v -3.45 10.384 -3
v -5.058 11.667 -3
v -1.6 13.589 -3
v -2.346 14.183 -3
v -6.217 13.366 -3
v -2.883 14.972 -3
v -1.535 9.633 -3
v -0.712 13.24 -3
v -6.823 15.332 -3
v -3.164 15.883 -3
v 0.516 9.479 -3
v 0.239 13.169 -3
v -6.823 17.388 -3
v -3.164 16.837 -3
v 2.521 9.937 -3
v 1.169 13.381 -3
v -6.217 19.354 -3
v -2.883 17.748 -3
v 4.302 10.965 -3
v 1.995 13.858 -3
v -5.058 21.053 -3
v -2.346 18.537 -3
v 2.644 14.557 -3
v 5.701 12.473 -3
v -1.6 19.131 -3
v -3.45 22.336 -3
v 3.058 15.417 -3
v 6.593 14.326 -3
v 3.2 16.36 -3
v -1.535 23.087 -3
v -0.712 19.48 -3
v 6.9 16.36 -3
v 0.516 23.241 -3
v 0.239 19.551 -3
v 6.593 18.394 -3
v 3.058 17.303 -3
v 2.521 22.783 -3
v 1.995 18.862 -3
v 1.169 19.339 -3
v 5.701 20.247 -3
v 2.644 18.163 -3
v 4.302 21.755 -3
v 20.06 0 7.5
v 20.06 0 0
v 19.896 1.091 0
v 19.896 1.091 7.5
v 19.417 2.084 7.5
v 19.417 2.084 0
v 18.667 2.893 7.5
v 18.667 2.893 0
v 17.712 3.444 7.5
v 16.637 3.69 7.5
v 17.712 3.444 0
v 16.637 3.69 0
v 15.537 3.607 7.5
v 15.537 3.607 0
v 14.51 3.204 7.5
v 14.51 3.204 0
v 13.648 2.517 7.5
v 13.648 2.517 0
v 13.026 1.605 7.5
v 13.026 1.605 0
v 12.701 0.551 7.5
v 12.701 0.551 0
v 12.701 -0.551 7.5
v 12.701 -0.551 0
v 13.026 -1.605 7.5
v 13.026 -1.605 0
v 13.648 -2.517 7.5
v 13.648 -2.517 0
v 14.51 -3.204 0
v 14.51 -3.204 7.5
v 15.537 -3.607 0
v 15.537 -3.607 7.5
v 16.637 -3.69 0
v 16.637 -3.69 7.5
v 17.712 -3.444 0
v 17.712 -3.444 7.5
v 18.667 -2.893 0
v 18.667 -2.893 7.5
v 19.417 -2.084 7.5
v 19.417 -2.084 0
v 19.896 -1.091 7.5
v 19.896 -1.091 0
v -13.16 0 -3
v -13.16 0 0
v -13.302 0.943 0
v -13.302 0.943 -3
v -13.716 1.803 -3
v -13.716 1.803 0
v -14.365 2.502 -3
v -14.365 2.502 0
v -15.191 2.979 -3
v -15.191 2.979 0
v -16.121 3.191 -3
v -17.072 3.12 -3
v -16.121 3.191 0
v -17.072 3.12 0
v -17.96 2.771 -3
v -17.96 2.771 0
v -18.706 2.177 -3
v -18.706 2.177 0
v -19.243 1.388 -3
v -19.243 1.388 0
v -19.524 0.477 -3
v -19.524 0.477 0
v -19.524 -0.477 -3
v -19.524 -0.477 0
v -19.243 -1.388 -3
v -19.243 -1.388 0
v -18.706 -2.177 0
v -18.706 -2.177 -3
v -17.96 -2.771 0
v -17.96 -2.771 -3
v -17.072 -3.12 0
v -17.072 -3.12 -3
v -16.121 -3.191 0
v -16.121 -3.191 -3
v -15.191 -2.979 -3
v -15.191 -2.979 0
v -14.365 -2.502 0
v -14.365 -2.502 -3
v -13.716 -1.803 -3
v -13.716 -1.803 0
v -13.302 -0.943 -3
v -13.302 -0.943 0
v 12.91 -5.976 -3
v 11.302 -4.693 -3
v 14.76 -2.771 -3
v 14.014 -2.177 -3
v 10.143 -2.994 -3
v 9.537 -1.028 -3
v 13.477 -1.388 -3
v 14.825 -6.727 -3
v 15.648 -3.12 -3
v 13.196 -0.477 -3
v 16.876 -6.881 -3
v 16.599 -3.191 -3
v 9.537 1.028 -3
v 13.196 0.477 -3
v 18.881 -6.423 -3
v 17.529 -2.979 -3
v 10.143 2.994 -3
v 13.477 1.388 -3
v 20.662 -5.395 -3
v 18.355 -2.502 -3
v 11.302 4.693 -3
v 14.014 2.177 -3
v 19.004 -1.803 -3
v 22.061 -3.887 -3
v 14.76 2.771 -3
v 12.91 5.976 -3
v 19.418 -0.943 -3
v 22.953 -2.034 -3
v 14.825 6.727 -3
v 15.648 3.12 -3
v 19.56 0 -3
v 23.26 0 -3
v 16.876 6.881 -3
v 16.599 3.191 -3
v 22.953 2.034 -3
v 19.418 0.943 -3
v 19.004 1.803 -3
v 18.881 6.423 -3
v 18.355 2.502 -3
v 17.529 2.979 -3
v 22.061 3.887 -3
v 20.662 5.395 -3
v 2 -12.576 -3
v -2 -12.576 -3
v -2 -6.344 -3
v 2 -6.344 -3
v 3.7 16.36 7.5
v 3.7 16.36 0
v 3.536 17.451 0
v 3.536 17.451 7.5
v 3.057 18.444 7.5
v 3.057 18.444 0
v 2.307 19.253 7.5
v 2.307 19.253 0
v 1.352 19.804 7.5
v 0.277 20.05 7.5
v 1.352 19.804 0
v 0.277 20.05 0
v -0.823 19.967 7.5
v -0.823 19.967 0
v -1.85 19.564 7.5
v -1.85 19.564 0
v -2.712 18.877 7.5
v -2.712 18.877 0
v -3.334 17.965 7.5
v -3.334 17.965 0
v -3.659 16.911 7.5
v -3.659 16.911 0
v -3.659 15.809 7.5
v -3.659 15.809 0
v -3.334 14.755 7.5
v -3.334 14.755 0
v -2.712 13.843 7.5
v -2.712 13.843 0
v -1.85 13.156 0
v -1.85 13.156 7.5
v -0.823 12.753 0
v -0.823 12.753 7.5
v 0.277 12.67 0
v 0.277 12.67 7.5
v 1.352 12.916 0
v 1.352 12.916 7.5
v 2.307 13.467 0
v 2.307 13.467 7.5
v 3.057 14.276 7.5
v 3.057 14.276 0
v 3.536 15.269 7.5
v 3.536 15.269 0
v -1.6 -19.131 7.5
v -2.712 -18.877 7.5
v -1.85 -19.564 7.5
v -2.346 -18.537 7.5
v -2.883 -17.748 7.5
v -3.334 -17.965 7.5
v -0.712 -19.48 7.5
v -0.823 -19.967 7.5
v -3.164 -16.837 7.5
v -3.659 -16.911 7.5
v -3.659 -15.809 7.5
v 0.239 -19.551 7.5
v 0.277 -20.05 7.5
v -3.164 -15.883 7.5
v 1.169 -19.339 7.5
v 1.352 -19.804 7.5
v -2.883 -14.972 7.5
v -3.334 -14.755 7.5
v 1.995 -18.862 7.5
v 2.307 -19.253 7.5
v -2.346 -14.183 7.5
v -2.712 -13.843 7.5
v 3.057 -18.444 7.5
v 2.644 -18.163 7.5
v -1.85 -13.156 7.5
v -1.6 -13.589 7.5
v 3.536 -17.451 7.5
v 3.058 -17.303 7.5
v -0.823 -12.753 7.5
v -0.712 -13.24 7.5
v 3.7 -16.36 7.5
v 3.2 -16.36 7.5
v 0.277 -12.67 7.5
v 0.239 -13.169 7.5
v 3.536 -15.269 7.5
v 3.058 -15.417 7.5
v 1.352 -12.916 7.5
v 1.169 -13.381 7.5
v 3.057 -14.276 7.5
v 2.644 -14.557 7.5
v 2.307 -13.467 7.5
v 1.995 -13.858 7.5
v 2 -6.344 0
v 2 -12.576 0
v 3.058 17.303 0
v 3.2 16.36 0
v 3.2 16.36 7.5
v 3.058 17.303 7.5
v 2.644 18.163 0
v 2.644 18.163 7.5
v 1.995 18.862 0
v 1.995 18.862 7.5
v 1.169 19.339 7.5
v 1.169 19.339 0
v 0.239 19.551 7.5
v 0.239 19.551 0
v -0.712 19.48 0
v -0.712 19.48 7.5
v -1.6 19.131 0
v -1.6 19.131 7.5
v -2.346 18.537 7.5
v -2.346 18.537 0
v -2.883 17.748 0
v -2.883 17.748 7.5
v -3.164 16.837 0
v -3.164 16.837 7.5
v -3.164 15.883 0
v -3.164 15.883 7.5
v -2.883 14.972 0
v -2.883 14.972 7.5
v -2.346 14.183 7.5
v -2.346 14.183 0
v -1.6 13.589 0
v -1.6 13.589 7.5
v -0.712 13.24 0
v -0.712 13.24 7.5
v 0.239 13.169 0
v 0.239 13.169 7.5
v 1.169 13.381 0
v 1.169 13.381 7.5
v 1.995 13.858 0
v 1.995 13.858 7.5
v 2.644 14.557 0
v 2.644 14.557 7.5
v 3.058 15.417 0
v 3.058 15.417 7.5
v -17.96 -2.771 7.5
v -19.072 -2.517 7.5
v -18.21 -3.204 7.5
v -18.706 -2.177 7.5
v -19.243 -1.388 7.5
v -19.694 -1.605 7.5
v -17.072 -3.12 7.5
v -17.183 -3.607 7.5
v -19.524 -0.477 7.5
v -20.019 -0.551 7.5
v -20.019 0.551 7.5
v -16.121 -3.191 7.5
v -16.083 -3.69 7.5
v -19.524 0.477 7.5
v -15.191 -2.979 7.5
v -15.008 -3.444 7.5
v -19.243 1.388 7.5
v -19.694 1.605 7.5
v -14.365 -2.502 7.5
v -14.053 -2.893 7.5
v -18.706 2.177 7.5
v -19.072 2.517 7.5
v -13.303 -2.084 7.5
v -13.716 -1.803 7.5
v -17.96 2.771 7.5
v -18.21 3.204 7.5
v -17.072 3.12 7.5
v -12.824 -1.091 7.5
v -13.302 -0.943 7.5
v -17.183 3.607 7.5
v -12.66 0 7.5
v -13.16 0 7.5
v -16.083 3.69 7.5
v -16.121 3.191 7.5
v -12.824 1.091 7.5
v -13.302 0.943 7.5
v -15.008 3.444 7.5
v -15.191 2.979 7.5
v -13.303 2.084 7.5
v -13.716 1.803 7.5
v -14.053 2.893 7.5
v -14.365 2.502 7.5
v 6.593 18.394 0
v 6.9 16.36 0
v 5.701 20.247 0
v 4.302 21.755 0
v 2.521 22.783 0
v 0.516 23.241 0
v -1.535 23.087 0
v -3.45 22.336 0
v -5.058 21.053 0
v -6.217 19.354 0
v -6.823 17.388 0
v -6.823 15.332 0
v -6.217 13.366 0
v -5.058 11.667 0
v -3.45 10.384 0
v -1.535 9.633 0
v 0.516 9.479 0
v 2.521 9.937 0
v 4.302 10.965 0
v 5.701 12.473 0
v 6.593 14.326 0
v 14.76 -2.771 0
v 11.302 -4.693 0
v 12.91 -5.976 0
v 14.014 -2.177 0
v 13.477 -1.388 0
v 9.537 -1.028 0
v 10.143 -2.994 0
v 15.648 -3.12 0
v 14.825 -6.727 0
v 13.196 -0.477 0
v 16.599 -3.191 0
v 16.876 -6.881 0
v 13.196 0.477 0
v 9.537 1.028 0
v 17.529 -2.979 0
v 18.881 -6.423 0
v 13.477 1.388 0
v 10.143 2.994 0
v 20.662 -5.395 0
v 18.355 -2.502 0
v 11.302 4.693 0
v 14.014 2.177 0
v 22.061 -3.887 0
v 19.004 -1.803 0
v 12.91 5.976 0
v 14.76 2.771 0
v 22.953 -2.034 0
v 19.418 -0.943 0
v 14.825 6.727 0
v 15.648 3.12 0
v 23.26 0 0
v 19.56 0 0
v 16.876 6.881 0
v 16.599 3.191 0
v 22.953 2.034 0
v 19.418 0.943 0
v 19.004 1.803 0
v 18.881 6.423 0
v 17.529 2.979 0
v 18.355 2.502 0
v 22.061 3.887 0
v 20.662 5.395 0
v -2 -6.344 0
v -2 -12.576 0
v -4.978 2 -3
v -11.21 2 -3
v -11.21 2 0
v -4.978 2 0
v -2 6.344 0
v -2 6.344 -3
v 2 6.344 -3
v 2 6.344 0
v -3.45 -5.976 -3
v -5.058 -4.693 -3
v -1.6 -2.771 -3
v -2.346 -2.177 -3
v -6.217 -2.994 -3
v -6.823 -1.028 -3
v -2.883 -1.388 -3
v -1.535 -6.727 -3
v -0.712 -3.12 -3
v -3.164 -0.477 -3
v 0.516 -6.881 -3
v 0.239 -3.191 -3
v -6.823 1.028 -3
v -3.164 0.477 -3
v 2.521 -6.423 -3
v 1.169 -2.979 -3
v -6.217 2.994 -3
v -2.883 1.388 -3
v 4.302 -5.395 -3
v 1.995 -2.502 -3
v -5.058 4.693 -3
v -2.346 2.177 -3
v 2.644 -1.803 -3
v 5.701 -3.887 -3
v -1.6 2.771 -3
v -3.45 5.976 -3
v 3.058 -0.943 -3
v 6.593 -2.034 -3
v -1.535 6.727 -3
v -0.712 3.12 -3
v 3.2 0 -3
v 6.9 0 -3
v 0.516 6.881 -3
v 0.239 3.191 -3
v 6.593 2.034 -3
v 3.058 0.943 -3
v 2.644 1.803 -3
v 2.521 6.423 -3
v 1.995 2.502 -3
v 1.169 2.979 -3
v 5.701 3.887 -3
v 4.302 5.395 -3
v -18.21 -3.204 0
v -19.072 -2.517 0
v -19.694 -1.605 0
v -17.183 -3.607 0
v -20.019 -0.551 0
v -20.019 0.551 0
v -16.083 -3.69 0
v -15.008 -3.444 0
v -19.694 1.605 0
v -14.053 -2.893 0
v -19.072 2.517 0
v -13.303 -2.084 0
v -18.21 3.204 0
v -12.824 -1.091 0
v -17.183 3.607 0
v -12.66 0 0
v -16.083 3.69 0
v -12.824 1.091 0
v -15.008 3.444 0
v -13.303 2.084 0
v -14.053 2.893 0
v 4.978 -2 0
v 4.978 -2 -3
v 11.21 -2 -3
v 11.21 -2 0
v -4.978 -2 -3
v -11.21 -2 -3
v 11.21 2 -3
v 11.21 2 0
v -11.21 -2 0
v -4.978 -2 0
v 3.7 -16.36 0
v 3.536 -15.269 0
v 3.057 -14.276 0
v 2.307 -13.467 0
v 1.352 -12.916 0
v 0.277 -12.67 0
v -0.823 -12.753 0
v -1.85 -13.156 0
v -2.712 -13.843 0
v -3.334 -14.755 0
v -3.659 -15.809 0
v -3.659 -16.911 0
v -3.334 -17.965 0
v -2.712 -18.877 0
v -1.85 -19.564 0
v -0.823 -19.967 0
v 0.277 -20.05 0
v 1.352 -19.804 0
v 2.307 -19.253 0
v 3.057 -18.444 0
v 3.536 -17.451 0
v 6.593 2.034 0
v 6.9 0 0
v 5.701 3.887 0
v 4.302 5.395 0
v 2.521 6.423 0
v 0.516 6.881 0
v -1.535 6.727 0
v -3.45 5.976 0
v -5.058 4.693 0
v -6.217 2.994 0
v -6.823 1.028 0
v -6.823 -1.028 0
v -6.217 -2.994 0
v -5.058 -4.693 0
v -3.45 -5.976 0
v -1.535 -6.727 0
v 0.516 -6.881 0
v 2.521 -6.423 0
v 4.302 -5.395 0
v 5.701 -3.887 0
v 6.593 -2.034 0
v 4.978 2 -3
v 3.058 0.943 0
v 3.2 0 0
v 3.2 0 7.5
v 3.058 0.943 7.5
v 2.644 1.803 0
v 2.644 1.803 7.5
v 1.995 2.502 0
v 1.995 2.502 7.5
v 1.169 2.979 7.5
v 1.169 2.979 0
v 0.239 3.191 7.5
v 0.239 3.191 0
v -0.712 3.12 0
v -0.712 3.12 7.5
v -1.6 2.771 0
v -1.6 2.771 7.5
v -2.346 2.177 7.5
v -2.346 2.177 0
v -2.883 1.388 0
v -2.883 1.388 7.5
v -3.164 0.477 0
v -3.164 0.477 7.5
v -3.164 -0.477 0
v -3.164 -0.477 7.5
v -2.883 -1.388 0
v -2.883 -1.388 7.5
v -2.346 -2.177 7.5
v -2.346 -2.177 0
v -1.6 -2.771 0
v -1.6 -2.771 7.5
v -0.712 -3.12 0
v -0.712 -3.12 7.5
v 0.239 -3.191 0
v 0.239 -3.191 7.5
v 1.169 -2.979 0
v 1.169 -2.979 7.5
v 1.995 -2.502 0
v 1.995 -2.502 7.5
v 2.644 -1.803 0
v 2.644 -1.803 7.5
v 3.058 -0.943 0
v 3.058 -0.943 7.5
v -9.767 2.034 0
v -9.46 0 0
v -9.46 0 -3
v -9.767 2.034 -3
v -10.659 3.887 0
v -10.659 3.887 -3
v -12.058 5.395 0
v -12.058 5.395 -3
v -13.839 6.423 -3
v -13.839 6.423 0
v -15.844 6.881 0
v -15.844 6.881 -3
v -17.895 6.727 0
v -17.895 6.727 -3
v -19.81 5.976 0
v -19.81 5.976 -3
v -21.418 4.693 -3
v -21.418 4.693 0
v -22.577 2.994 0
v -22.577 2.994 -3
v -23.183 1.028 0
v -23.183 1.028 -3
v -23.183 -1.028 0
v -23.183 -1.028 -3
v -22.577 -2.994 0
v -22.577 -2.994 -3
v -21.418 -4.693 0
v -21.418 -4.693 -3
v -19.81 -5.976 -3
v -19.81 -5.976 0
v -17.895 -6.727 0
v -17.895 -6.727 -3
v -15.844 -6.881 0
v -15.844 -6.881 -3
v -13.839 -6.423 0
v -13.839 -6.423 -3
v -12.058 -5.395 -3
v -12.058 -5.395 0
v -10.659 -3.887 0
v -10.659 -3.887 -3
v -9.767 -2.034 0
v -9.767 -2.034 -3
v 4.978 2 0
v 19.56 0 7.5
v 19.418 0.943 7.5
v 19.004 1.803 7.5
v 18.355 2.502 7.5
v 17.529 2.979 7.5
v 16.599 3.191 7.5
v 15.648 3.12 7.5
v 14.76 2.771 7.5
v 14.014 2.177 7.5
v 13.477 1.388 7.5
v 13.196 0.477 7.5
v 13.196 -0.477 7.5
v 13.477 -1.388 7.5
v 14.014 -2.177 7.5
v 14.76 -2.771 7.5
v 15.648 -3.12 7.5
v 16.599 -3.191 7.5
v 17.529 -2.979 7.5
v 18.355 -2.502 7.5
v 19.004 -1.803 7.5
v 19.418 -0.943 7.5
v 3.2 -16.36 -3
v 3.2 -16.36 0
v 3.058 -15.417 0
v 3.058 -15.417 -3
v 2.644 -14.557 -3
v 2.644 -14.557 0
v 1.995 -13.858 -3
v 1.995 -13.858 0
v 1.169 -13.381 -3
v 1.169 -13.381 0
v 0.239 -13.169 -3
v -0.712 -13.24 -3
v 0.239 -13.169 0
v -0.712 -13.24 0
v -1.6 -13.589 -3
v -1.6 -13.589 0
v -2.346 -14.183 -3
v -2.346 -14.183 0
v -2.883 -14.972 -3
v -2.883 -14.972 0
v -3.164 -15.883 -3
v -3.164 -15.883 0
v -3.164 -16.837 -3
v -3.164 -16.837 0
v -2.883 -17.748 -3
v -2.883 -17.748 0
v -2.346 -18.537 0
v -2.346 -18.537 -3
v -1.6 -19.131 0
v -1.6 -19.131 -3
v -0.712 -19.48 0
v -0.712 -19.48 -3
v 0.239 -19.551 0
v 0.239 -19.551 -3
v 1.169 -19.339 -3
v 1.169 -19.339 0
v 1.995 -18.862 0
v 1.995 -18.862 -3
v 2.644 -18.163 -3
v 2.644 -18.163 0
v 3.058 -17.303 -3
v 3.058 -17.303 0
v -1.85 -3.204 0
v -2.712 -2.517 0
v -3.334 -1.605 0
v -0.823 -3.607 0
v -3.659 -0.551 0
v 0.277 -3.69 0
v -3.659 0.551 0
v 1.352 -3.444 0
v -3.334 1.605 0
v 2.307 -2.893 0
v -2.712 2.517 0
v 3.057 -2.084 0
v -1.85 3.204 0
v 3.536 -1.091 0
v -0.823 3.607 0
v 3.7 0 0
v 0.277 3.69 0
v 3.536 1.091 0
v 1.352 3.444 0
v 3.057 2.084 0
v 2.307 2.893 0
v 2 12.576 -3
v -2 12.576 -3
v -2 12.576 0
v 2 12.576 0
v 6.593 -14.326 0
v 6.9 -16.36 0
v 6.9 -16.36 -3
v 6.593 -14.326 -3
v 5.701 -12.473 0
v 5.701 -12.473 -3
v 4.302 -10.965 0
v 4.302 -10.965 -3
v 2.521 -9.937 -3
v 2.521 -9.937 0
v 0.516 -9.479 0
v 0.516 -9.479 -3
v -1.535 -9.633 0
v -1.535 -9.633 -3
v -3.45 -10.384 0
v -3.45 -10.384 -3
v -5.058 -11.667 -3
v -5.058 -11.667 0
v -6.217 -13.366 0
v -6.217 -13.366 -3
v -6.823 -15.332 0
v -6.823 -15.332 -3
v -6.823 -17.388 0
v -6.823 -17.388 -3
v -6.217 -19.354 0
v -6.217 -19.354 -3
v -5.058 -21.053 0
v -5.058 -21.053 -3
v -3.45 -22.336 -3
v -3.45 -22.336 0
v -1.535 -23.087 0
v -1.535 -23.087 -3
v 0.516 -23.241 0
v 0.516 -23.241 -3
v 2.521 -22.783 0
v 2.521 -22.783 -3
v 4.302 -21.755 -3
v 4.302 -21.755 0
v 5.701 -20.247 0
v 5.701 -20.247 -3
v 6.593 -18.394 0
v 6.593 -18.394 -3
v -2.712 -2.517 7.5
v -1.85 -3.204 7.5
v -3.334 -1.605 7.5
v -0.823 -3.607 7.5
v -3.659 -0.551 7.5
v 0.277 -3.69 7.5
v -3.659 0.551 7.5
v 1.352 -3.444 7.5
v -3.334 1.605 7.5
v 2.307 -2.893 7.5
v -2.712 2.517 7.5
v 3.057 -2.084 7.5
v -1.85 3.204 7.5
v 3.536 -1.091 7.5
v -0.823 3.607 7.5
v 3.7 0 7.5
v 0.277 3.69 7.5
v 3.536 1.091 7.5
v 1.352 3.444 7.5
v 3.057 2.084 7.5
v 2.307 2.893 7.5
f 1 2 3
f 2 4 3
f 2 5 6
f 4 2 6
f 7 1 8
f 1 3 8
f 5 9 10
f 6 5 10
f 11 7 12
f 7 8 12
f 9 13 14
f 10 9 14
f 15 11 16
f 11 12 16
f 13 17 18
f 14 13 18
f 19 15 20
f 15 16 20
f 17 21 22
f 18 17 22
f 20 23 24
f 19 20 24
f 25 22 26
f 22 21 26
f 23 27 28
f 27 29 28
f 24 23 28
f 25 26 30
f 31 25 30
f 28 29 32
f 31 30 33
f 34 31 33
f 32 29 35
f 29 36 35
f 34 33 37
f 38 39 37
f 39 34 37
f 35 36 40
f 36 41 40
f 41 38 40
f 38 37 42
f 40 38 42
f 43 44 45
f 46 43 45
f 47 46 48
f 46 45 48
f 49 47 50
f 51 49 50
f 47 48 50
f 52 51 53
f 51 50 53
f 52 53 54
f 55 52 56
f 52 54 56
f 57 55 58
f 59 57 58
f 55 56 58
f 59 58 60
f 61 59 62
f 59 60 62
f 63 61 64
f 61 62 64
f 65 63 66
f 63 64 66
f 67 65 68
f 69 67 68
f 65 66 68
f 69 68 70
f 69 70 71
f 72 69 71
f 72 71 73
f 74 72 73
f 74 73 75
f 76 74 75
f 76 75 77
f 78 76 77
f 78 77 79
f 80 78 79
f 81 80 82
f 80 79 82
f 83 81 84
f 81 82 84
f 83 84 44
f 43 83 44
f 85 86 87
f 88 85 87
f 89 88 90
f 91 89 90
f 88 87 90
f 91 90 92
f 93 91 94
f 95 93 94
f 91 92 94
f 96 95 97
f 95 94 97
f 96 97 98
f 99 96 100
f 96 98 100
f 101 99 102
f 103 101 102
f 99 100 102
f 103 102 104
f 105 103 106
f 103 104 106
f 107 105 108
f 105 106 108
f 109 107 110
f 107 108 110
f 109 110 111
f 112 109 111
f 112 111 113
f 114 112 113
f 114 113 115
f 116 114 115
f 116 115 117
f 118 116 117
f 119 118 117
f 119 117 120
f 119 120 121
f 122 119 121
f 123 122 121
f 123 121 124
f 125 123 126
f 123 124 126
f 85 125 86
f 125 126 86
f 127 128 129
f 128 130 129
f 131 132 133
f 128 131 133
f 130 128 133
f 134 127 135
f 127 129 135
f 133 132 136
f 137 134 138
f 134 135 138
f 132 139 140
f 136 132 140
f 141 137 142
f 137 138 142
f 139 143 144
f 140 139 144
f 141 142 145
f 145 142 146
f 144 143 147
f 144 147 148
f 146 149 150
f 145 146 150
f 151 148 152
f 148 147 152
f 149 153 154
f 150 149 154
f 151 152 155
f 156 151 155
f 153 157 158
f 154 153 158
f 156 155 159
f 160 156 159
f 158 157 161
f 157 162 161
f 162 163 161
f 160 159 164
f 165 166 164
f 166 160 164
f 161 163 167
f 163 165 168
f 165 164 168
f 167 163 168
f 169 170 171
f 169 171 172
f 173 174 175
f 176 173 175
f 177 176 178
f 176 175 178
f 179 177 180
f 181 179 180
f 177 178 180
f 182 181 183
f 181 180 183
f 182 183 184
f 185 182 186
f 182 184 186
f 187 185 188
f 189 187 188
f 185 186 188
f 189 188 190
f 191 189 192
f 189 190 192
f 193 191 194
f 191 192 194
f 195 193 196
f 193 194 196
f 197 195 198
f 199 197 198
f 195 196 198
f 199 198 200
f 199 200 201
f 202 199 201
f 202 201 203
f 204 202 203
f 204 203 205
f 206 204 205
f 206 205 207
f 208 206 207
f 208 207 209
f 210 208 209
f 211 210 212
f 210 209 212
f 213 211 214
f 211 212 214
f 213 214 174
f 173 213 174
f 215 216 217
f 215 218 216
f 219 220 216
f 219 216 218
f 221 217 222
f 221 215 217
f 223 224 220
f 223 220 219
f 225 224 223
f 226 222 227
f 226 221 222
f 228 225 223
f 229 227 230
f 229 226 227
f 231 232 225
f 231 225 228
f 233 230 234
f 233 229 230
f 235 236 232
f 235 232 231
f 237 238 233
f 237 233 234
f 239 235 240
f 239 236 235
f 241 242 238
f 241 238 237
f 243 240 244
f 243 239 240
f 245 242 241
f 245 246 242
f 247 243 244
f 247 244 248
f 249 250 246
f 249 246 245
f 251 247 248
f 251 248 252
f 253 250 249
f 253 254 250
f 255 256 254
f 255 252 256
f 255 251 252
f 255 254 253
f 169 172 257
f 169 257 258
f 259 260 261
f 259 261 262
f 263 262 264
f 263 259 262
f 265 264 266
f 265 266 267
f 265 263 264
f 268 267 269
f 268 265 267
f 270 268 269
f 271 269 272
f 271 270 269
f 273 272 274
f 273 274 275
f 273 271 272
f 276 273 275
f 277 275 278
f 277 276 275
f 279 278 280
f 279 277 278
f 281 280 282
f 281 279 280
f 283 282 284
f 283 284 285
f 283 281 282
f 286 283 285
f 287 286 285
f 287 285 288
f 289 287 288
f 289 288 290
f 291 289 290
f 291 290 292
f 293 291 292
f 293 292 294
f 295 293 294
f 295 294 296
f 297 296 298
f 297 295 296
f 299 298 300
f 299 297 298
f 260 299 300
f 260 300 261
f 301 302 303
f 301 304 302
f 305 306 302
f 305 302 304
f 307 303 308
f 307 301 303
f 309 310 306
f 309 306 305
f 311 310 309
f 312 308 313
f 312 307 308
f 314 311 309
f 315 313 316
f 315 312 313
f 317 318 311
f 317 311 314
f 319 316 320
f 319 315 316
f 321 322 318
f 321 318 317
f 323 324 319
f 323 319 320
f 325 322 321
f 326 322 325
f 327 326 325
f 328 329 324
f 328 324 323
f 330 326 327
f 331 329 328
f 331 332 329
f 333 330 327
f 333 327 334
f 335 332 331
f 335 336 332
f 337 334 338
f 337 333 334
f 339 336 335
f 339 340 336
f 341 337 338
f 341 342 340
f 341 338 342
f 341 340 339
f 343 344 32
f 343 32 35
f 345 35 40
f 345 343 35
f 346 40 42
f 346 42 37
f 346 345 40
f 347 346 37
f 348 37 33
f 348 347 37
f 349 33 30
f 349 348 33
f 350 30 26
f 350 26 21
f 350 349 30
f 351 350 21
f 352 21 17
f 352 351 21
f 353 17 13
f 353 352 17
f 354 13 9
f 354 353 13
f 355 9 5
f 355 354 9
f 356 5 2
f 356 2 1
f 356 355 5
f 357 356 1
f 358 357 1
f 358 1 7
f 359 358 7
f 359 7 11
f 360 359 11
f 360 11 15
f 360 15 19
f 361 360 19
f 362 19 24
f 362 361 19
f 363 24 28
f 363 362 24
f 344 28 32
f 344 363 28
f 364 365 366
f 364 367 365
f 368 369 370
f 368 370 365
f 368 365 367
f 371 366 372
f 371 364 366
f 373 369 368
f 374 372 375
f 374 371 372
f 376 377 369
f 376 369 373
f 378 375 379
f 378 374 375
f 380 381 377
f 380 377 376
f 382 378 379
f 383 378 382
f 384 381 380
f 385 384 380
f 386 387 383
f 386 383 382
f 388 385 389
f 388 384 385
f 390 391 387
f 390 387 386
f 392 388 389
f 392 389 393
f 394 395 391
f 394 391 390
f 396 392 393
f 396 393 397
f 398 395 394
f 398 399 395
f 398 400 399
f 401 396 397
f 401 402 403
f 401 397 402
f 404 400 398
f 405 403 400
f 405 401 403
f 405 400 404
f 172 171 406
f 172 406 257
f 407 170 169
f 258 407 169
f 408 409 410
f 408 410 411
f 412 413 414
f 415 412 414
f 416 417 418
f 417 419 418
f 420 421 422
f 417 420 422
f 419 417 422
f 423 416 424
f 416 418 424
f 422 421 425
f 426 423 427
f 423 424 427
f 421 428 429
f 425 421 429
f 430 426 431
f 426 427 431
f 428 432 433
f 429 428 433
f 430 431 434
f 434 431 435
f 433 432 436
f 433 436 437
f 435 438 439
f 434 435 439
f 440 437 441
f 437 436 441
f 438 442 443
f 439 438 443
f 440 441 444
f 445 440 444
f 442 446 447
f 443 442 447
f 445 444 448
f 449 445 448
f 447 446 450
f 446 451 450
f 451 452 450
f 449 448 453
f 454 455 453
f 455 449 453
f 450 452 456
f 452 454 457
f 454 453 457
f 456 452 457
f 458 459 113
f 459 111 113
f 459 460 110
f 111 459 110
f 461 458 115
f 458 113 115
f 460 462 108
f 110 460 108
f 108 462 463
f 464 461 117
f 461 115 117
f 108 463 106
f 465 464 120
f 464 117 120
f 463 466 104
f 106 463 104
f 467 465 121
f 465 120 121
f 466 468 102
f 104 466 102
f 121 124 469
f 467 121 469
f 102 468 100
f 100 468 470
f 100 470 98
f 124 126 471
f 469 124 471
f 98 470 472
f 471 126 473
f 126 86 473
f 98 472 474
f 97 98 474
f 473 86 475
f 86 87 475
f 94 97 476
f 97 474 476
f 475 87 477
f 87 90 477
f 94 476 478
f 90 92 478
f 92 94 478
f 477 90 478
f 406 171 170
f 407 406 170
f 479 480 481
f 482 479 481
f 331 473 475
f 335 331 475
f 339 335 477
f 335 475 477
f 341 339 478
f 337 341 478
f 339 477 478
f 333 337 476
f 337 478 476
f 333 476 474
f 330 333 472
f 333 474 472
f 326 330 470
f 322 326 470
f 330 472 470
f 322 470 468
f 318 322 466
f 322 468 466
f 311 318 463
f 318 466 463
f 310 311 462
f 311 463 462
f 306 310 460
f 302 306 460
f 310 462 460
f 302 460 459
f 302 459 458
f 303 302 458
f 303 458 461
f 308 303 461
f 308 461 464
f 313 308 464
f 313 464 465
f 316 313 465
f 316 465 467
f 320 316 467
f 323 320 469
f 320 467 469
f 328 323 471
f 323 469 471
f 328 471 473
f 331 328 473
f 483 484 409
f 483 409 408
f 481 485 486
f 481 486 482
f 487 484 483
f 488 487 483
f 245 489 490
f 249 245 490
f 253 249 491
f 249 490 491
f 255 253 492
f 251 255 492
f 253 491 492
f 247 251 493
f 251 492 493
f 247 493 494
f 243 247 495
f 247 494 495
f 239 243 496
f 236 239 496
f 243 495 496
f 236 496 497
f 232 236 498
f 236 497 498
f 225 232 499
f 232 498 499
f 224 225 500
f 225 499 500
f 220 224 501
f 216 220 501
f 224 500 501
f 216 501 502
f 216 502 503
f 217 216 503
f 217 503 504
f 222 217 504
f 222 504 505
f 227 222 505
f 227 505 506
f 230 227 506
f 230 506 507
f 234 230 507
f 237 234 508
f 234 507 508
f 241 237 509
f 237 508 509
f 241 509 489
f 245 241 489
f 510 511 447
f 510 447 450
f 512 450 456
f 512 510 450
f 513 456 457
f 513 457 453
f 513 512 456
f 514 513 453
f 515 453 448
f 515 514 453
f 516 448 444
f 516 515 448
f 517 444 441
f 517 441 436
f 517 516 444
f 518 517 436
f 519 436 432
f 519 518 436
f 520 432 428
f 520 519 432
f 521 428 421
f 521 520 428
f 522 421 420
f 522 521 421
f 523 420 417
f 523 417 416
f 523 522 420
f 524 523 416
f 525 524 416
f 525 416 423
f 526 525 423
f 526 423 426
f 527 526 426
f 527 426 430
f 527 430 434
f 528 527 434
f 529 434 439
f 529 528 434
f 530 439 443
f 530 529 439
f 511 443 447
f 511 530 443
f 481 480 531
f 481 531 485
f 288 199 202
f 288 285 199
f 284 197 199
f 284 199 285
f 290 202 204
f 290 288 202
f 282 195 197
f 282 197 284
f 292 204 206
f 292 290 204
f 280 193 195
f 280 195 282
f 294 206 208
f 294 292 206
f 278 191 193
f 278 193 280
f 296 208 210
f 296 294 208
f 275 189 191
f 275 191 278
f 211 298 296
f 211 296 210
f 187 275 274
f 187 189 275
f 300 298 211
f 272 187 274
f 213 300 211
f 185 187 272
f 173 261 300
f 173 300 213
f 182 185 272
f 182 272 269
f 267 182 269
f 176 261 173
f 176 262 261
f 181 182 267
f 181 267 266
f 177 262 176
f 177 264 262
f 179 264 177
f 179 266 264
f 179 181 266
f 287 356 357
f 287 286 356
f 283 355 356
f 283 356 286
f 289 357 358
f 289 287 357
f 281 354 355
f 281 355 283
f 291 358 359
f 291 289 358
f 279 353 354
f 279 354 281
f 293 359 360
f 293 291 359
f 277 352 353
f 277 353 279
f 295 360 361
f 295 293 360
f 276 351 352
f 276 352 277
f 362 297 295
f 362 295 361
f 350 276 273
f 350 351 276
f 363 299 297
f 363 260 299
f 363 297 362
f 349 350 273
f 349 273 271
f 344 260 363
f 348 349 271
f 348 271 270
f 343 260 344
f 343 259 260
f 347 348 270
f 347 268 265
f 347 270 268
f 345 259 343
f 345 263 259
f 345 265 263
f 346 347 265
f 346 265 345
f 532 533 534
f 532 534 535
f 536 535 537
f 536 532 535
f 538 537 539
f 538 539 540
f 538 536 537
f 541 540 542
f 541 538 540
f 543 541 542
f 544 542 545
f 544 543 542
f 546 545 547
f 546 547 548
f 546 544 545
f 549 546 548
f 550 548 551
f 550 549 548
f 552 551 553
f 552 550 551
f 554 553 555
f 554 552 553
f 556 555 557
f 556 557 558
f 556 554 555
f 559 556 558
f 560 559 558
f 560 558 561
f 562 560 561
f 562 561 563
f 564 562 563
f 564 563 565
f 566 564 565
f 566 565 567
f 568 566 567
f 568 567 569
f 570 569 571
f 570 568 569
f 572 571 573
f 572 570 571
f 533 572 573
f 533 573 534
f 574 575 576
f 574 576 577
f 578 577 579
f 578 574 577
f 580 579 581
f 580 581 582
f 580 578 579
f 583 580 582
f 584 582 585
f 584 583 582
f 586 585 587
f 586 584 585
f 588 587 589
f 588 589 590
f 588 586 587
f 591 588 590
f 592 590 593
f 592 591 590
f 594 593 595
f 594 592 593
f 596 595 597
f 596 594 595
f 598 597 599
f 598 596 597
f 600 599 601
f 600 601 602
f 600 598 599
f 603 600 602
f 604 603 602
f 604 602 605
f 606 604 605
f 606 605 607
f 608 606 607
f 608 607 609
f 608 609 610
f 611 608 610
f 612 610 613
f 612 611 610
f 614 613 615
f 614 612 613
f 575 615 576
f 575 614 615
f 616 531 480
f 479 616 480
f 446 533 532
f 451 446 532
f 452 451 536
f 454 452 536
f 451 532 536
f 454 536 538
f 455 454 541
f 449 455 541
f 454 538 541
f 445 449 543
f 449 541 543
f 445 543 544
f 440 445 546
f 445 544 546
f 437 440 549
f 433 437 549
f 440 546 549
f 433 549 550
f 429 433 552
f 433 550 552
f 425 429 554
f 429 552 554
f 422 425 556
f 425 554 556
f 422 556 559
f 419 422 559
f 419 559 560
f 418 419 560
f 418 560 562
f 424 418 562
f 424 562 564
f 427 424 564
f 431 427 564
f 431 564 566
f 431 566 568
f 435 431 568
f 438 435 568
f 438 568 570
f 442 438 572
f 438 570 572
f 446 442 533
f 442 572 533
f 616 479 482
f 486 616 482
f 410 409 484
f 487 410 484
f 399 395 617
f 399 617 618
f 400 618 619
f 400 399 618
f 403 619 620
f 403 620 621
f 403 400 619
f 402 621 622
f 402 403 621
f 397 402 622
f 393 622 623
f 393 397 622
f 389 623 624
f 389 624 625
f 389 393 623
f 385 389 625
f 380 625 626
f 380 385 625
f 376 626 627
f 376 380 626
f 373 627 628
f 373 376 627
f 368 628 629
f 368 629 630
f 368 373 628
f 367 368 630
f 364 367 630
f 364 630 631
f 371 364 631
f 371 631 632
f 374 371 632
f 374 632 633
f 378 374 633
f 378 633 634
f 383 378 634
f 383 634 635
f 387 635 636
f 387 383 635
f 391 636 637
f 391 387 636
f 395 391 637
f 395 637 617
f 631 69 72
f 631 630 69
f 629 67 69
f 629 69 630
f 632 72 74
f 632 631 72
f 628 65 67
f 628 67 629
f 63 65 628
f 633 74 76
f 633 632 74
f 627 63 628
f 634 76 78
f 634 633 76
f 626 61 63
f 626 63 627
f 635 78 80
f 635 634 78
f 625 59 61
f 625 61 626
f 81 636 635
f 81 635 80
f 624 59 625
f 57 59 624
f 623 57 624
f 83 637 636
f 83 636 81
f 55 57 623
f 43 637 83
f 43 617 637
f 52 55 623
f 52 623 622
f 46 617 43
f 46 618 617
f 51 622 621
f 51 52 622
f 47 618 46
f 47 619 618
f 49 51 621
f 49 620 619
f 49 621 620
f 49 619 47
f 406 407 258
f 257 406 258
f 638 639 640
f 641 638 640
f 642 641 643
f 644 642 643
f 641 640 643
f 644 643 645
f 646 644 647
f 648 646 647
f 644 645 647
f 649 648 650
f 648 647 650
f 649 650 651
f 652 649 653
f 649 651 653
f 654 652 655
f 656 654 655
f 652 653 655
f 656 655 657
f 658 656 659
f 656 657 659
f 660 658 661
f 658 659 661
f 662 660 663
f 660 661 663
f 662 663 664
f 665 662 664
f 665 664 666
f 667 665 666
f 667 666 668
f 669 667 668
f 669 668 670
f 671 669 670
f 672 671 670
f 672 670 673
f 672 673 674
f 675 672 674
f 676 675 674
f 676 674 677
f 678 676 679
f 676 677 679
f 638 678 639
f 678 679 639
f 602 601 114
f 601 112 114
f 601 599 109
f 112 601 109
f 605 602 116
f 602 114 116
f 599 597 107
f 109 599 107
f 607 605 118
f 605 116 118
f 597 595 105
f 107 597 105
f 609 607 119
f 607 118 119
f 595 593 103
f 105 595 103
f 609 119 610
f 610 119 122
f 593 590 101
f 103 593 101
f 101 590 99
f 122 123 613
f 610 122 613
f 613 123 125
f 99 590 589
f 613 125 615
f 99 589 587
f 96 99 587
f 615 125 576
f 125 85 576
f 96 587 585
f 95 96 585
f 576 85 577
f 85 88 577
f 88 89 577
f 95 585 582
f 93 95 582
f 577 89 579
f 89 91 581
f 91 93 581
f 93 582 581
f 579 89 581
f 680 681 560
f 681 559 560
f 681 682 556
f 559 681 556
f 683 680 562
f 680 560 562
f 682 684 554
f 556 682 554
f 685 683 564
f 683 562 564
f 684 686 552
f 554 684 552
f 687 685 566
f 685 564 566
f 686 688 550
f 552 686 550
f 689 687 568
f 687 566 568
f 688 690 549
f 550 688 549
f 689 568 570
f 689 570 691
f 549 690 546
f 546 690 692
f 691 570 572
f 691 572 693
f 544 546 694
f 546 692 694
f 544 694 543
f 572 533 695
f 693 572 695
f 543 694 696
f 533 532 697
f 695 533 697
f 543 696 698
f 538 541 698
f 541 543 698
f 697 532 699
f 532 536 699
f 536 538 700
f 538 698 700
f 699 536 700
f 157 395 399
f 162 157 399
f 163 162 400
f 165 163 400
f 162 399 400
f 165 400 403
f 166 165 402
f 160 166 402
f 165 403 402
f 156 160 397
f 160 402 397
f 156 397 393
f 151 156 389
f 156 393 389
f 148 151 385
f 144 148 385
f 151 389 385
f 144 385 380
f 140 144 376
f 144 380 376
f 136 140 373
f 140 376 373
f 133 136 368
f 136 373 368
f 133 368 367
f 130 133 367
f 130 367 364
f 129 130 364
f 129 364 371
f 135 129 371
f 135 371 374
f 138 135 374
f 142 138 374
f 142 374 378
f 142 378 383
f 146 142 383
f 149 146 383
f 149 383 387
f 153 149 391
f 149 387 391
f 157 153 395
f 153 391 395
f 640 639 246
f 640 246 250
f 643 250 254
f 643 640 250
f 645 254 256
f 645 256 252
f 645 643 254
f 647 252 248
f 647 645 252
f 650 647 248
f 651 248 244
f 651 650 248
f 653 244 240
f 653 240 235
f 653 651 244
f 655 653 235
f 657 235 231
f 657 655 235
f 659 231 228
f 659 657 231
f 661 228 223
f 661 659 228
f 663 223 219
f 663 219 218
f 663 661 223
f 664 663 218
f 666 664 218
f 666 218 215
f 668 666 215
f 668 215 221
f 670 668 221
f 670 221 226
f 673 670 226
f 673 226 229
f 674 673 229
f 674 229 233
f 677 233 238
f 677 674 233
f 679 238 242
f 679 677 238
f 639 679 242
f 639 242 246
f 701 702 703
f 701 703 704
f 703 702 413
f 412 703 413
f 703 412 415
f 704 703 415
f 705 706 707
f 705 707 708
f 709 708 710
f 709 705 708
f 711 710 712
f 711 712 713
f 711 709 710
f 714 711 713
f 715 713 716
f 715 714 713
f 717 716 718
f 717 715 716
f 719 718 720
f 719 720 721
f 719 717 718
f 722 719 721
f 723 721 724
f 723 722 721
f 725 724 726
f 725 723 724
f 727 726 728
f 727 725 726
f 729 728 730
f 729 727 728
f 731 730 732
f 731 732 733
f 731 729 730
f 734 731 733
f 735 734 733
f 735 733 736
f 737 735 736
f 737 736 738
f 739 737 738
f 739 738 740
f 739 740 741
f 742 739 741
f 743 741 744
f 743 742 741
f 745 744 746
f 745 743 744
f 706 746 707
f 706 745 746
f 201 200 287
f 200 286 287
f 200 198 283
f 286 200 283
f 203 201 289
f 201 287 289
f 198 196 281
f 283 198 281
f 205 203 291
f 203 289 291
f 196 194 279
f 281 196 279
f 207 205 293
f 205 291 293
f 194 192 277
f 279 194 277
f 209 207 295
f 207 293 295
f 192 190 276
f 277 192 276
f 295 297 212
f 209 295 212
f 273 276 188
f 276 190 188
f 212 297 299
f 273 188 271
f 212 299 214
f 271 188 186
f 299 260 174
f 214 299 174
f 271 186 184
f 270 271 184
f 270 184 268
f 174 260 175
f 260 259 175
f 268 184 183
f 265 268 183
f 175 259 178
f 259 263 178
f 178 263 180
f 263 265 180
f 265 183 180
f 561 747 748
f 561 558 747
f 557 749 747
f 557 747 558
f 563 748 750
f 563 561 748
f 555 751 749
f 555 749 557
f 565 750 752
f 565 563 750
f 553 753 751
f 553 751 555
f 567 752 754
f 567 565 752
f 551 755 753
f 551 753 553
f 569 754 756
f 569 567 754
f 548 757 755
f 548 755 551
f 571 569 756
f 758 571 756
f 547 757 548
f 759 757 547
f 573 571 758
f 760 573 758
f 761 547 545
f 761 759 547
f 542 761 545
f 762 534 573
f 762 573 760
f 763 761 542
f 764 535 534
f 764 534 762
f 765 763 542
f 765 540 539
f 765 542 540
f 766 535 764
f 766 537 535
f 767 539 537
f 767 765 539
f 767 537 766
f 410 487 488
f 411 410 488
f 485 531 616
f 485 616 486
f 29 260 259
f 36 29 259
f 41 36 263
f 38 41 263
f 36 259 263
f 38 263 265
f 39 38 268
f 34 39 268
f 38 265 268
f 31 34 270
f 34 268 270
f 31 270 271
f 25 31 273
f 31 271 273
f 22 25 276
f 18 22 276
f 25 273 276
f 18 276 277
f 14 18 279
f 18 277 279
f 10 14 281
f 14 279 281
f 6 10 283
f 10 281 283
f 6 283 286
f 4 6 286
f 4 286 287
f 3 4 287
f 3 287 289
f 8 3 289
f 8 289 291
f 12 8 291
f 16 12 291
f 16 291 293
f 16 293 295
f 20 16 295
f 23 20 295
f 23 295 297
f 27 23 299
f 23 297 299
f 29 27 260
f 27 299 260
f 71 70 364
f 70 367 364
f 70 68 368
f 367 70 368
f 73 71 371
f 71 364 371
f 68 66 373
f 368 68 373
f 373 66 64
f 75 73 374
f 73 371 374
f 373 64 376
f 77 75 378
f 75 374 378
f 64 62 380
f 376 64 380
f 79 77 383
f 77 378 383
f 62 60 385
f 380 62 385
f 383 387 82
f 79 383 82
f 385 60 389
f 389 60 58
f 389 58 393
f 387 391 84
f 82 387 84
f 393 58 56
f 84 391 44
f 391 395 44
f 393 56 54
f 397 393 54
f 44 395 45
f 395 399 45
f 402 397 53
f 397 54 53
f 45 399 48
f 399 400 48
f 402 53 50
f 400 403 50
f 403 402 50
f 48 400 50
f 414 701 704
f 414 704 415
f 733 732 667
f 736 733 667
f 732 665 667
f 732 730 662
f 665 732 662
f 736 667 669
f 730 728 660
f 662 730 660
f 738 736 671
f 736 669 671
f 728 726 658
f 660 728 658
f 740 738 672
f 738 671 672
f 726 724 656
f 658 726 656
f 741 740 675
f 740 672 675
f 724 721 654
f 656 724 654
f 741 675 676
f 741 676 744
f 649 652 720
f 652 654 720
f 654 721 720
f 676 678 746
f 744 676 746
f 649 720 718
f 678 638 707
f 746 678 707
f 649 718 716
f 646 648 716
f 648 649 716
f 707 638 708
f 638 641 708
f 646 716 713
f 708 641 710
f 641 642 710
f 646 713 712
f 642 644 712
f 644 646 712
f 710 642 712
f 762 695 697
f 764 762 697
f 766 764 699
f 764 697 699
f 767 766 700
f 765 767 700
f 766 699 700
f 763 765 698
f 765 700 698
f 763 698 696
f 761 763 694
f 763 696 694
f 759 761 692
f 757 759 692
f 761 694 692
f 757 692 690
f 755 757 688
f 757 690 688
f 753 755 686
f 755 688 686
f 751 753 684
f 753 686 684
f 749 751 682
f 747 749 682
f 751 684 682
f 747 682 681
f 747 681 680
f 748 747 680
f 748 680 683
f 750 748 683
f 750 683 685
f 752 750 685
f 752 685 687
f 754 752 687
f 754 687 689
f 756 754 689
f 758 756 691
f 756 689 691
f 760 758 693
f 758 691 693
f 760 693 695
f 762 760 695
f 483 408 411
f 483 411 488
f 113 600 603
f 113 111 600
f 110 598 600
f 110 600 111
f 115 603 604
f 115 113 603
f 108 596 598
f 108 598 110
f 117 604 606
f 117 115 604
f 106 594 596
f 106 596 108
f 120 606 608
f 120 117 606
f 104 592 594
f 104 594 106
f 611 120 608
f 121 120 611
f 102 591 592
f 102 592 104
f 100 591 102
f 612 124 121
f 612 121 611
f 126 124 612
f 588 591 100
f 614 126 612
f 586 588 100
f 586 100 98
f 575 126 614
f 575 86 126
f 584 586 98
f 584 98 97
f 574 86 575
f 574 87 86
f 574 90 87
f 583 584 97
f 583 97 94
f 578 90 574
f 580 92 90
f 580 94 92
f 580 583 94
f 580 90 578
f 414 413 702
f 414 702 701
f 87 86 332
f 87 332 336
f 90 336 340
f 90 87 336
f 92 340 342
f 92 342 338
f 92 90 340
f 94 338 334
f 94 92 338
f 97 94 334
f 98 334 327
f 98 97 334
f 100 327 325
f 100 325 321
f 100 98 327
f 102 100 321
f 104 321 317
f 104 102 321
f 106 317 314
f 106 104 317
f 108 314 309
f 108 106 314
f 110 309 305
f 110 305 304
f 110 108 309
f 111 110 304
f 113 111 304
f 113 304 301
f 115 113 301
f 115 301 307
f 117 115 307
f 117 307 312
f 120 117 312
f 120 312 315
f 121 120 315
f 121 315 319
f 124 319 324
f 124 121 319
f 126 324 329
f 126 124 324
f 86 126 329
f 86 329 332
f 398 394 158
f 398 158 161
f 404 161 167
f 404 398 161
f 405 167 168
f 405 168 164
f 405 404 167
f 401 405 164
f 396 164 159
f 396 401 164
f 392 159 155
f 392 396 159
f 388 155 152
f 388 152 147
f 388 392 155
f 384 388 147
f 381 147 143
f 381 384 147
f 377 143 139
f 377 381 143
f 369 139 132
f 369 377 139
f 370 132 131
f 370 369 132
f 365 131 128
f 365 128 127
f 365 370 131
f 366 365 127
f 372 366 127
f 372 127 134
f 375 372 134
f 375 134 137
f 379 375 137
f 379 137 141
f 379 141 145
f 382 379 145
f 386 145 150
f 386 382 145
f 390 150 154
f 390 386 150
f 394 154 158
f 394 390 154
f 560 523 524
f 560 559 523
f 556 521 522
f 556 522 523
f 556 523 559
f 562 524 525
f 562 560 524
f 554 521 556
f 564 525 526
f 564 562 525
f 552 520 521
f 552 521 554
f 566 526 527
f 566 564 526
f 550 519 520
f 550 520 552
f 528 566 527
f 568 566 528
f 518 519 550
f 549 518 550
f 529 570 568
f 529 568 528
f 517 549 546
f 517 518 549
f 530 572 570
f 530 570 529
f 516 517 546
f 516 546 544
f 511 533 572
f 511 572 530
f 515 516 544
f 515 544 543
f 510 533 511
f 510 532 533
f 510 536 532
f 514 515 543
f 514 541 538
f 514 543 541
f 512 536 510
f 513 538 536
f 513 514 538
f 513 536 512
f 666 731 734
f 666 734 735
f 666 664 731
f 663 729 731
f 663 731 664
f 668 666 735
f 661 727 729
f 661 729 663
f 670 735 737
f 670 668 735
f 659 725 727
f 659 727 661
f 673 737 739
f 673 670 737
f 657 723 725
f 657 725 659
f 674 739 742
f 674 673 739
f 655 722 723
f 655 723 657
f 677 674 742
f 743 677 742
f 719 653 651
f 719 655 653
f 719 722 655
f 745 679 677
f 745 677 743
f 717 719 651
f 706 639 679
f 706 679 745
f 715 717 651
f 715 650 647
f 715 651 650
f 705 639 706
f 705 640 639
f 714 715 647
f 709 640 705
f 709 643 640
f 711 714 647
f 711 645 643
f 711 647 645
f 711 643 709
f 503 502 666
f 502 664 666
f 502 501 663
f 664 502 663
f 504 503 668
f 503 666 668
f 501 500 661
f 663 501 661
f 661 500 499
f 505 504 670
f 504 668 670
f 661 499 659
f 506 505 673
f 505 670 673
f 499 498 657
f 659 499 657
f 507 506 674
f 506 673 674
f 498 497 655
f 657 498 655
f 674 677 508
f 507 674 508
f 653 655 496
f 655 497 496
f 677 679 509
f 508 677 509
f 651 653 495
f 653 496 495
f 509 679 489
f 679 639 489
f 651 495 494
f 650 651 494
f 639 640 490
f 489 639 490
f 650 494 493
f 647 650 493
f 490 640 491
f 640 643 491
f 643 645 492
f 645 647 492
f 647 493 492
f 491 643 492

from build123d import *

# Parameters (mm, degrees)
F0_R     = 3.7
F0_R_2   = 3.2
F1_DEPTH = 7.5
F2_R     = 6.9
F2_R_2   = 3.2
F3_DEPTH = 3
F4_W     = 4
F4_H     = 6.231944
F4_W_2   = 6.231944
F4_H_2   = 4
F5_DEPTH = 3


with BuildPart() as f1:
    # F0 (on Top) → F1 (new body)
    with BuildSketch(Plane.XY):
        Circle(F0_R)
        Circle(F0_R_2, mode=Mode.SUBTRACT)
        with Locations((0, 16.36)):
            Circle(F0_R)
        with Locations((0, 16.36)):
            Circle(F0_R_2, mode=Mode.SUBTRACT)
        with Locations((0, -16.36)):
            Circle(F0_R)
        with Locations((0, -16.36)):
            Circle(F0_R_2, mode=Mode.SUBTRACT)
        with Locations((16.36, 0)):
            Circle(F0_R)
        with Locations((16.36, 0)):
            Circle(F0_R_2, mode=Mode.SUBTRACT)
        with Locations((-16.36, 0)):
            Circle(F0_R)
        with Locations((-16.36, 0)):
            Circle(F0_R_2, mode=Mode.SUBTRACT)
    extrude(amount=F1_DEPTH)


with BuildPart() as f3:
    # F2 (on Top) → F3 (new body)
    with BuildSketch(Plane.XY):
        Circle(F2_R)
        Circle(F2_R_2, mode=Mode.SUBTRACT)
        with Locations((16.36, 0)):
            Circle(F2_R)
        with Locations((16.36, 0)):
            Circle(F2_R_2, mode=Mode.SUBTRACT)
        with Locations((0, 16.36)):
            Circle(F2_R)
        with Locations((0, 16.36)):
            Circle(F2_R_2, mode=Mode.SUBTRACT)
        with Locations((0, -16.36)):
            Circle(F2_R)
        with Locations((0, -16.36)):
            Circle(F2_R_2, mode=Mode.SUBTRACT)
        with Locations((-16.36, 0)):
            Circle(F2_R)
        with Locations((-16.36, 0)):
            Circle(F2_R_2, mode=Mode.SUBTRACT)
    extrude(amount=-F3_DEPTH)


with BuildPart() as f5:
    # F4 (on face) → F5 (new body)
    with BuildSketch(Plane(origin=(0, 0, -3), x_dir=(1, 0, 0), z_dir=(0, 0, -1))):
        with Locations((0, 9.46)):
            Rectangle(F4_W, F4_H)
        with Locations((0, -9.46)):
            Rectangle(F4_W, F4_H)
        with Locations((-8.094359, 0)):
            Rectangle(F4_W_2, F4_H_2)
        with Locations((8.094359, 0)):
            Rectangle(F4_W_2, F4_H_2)
    extrude(amount=-F5_DEPTH)


solid = Compound([f1.part, f3.part, f5.part])
